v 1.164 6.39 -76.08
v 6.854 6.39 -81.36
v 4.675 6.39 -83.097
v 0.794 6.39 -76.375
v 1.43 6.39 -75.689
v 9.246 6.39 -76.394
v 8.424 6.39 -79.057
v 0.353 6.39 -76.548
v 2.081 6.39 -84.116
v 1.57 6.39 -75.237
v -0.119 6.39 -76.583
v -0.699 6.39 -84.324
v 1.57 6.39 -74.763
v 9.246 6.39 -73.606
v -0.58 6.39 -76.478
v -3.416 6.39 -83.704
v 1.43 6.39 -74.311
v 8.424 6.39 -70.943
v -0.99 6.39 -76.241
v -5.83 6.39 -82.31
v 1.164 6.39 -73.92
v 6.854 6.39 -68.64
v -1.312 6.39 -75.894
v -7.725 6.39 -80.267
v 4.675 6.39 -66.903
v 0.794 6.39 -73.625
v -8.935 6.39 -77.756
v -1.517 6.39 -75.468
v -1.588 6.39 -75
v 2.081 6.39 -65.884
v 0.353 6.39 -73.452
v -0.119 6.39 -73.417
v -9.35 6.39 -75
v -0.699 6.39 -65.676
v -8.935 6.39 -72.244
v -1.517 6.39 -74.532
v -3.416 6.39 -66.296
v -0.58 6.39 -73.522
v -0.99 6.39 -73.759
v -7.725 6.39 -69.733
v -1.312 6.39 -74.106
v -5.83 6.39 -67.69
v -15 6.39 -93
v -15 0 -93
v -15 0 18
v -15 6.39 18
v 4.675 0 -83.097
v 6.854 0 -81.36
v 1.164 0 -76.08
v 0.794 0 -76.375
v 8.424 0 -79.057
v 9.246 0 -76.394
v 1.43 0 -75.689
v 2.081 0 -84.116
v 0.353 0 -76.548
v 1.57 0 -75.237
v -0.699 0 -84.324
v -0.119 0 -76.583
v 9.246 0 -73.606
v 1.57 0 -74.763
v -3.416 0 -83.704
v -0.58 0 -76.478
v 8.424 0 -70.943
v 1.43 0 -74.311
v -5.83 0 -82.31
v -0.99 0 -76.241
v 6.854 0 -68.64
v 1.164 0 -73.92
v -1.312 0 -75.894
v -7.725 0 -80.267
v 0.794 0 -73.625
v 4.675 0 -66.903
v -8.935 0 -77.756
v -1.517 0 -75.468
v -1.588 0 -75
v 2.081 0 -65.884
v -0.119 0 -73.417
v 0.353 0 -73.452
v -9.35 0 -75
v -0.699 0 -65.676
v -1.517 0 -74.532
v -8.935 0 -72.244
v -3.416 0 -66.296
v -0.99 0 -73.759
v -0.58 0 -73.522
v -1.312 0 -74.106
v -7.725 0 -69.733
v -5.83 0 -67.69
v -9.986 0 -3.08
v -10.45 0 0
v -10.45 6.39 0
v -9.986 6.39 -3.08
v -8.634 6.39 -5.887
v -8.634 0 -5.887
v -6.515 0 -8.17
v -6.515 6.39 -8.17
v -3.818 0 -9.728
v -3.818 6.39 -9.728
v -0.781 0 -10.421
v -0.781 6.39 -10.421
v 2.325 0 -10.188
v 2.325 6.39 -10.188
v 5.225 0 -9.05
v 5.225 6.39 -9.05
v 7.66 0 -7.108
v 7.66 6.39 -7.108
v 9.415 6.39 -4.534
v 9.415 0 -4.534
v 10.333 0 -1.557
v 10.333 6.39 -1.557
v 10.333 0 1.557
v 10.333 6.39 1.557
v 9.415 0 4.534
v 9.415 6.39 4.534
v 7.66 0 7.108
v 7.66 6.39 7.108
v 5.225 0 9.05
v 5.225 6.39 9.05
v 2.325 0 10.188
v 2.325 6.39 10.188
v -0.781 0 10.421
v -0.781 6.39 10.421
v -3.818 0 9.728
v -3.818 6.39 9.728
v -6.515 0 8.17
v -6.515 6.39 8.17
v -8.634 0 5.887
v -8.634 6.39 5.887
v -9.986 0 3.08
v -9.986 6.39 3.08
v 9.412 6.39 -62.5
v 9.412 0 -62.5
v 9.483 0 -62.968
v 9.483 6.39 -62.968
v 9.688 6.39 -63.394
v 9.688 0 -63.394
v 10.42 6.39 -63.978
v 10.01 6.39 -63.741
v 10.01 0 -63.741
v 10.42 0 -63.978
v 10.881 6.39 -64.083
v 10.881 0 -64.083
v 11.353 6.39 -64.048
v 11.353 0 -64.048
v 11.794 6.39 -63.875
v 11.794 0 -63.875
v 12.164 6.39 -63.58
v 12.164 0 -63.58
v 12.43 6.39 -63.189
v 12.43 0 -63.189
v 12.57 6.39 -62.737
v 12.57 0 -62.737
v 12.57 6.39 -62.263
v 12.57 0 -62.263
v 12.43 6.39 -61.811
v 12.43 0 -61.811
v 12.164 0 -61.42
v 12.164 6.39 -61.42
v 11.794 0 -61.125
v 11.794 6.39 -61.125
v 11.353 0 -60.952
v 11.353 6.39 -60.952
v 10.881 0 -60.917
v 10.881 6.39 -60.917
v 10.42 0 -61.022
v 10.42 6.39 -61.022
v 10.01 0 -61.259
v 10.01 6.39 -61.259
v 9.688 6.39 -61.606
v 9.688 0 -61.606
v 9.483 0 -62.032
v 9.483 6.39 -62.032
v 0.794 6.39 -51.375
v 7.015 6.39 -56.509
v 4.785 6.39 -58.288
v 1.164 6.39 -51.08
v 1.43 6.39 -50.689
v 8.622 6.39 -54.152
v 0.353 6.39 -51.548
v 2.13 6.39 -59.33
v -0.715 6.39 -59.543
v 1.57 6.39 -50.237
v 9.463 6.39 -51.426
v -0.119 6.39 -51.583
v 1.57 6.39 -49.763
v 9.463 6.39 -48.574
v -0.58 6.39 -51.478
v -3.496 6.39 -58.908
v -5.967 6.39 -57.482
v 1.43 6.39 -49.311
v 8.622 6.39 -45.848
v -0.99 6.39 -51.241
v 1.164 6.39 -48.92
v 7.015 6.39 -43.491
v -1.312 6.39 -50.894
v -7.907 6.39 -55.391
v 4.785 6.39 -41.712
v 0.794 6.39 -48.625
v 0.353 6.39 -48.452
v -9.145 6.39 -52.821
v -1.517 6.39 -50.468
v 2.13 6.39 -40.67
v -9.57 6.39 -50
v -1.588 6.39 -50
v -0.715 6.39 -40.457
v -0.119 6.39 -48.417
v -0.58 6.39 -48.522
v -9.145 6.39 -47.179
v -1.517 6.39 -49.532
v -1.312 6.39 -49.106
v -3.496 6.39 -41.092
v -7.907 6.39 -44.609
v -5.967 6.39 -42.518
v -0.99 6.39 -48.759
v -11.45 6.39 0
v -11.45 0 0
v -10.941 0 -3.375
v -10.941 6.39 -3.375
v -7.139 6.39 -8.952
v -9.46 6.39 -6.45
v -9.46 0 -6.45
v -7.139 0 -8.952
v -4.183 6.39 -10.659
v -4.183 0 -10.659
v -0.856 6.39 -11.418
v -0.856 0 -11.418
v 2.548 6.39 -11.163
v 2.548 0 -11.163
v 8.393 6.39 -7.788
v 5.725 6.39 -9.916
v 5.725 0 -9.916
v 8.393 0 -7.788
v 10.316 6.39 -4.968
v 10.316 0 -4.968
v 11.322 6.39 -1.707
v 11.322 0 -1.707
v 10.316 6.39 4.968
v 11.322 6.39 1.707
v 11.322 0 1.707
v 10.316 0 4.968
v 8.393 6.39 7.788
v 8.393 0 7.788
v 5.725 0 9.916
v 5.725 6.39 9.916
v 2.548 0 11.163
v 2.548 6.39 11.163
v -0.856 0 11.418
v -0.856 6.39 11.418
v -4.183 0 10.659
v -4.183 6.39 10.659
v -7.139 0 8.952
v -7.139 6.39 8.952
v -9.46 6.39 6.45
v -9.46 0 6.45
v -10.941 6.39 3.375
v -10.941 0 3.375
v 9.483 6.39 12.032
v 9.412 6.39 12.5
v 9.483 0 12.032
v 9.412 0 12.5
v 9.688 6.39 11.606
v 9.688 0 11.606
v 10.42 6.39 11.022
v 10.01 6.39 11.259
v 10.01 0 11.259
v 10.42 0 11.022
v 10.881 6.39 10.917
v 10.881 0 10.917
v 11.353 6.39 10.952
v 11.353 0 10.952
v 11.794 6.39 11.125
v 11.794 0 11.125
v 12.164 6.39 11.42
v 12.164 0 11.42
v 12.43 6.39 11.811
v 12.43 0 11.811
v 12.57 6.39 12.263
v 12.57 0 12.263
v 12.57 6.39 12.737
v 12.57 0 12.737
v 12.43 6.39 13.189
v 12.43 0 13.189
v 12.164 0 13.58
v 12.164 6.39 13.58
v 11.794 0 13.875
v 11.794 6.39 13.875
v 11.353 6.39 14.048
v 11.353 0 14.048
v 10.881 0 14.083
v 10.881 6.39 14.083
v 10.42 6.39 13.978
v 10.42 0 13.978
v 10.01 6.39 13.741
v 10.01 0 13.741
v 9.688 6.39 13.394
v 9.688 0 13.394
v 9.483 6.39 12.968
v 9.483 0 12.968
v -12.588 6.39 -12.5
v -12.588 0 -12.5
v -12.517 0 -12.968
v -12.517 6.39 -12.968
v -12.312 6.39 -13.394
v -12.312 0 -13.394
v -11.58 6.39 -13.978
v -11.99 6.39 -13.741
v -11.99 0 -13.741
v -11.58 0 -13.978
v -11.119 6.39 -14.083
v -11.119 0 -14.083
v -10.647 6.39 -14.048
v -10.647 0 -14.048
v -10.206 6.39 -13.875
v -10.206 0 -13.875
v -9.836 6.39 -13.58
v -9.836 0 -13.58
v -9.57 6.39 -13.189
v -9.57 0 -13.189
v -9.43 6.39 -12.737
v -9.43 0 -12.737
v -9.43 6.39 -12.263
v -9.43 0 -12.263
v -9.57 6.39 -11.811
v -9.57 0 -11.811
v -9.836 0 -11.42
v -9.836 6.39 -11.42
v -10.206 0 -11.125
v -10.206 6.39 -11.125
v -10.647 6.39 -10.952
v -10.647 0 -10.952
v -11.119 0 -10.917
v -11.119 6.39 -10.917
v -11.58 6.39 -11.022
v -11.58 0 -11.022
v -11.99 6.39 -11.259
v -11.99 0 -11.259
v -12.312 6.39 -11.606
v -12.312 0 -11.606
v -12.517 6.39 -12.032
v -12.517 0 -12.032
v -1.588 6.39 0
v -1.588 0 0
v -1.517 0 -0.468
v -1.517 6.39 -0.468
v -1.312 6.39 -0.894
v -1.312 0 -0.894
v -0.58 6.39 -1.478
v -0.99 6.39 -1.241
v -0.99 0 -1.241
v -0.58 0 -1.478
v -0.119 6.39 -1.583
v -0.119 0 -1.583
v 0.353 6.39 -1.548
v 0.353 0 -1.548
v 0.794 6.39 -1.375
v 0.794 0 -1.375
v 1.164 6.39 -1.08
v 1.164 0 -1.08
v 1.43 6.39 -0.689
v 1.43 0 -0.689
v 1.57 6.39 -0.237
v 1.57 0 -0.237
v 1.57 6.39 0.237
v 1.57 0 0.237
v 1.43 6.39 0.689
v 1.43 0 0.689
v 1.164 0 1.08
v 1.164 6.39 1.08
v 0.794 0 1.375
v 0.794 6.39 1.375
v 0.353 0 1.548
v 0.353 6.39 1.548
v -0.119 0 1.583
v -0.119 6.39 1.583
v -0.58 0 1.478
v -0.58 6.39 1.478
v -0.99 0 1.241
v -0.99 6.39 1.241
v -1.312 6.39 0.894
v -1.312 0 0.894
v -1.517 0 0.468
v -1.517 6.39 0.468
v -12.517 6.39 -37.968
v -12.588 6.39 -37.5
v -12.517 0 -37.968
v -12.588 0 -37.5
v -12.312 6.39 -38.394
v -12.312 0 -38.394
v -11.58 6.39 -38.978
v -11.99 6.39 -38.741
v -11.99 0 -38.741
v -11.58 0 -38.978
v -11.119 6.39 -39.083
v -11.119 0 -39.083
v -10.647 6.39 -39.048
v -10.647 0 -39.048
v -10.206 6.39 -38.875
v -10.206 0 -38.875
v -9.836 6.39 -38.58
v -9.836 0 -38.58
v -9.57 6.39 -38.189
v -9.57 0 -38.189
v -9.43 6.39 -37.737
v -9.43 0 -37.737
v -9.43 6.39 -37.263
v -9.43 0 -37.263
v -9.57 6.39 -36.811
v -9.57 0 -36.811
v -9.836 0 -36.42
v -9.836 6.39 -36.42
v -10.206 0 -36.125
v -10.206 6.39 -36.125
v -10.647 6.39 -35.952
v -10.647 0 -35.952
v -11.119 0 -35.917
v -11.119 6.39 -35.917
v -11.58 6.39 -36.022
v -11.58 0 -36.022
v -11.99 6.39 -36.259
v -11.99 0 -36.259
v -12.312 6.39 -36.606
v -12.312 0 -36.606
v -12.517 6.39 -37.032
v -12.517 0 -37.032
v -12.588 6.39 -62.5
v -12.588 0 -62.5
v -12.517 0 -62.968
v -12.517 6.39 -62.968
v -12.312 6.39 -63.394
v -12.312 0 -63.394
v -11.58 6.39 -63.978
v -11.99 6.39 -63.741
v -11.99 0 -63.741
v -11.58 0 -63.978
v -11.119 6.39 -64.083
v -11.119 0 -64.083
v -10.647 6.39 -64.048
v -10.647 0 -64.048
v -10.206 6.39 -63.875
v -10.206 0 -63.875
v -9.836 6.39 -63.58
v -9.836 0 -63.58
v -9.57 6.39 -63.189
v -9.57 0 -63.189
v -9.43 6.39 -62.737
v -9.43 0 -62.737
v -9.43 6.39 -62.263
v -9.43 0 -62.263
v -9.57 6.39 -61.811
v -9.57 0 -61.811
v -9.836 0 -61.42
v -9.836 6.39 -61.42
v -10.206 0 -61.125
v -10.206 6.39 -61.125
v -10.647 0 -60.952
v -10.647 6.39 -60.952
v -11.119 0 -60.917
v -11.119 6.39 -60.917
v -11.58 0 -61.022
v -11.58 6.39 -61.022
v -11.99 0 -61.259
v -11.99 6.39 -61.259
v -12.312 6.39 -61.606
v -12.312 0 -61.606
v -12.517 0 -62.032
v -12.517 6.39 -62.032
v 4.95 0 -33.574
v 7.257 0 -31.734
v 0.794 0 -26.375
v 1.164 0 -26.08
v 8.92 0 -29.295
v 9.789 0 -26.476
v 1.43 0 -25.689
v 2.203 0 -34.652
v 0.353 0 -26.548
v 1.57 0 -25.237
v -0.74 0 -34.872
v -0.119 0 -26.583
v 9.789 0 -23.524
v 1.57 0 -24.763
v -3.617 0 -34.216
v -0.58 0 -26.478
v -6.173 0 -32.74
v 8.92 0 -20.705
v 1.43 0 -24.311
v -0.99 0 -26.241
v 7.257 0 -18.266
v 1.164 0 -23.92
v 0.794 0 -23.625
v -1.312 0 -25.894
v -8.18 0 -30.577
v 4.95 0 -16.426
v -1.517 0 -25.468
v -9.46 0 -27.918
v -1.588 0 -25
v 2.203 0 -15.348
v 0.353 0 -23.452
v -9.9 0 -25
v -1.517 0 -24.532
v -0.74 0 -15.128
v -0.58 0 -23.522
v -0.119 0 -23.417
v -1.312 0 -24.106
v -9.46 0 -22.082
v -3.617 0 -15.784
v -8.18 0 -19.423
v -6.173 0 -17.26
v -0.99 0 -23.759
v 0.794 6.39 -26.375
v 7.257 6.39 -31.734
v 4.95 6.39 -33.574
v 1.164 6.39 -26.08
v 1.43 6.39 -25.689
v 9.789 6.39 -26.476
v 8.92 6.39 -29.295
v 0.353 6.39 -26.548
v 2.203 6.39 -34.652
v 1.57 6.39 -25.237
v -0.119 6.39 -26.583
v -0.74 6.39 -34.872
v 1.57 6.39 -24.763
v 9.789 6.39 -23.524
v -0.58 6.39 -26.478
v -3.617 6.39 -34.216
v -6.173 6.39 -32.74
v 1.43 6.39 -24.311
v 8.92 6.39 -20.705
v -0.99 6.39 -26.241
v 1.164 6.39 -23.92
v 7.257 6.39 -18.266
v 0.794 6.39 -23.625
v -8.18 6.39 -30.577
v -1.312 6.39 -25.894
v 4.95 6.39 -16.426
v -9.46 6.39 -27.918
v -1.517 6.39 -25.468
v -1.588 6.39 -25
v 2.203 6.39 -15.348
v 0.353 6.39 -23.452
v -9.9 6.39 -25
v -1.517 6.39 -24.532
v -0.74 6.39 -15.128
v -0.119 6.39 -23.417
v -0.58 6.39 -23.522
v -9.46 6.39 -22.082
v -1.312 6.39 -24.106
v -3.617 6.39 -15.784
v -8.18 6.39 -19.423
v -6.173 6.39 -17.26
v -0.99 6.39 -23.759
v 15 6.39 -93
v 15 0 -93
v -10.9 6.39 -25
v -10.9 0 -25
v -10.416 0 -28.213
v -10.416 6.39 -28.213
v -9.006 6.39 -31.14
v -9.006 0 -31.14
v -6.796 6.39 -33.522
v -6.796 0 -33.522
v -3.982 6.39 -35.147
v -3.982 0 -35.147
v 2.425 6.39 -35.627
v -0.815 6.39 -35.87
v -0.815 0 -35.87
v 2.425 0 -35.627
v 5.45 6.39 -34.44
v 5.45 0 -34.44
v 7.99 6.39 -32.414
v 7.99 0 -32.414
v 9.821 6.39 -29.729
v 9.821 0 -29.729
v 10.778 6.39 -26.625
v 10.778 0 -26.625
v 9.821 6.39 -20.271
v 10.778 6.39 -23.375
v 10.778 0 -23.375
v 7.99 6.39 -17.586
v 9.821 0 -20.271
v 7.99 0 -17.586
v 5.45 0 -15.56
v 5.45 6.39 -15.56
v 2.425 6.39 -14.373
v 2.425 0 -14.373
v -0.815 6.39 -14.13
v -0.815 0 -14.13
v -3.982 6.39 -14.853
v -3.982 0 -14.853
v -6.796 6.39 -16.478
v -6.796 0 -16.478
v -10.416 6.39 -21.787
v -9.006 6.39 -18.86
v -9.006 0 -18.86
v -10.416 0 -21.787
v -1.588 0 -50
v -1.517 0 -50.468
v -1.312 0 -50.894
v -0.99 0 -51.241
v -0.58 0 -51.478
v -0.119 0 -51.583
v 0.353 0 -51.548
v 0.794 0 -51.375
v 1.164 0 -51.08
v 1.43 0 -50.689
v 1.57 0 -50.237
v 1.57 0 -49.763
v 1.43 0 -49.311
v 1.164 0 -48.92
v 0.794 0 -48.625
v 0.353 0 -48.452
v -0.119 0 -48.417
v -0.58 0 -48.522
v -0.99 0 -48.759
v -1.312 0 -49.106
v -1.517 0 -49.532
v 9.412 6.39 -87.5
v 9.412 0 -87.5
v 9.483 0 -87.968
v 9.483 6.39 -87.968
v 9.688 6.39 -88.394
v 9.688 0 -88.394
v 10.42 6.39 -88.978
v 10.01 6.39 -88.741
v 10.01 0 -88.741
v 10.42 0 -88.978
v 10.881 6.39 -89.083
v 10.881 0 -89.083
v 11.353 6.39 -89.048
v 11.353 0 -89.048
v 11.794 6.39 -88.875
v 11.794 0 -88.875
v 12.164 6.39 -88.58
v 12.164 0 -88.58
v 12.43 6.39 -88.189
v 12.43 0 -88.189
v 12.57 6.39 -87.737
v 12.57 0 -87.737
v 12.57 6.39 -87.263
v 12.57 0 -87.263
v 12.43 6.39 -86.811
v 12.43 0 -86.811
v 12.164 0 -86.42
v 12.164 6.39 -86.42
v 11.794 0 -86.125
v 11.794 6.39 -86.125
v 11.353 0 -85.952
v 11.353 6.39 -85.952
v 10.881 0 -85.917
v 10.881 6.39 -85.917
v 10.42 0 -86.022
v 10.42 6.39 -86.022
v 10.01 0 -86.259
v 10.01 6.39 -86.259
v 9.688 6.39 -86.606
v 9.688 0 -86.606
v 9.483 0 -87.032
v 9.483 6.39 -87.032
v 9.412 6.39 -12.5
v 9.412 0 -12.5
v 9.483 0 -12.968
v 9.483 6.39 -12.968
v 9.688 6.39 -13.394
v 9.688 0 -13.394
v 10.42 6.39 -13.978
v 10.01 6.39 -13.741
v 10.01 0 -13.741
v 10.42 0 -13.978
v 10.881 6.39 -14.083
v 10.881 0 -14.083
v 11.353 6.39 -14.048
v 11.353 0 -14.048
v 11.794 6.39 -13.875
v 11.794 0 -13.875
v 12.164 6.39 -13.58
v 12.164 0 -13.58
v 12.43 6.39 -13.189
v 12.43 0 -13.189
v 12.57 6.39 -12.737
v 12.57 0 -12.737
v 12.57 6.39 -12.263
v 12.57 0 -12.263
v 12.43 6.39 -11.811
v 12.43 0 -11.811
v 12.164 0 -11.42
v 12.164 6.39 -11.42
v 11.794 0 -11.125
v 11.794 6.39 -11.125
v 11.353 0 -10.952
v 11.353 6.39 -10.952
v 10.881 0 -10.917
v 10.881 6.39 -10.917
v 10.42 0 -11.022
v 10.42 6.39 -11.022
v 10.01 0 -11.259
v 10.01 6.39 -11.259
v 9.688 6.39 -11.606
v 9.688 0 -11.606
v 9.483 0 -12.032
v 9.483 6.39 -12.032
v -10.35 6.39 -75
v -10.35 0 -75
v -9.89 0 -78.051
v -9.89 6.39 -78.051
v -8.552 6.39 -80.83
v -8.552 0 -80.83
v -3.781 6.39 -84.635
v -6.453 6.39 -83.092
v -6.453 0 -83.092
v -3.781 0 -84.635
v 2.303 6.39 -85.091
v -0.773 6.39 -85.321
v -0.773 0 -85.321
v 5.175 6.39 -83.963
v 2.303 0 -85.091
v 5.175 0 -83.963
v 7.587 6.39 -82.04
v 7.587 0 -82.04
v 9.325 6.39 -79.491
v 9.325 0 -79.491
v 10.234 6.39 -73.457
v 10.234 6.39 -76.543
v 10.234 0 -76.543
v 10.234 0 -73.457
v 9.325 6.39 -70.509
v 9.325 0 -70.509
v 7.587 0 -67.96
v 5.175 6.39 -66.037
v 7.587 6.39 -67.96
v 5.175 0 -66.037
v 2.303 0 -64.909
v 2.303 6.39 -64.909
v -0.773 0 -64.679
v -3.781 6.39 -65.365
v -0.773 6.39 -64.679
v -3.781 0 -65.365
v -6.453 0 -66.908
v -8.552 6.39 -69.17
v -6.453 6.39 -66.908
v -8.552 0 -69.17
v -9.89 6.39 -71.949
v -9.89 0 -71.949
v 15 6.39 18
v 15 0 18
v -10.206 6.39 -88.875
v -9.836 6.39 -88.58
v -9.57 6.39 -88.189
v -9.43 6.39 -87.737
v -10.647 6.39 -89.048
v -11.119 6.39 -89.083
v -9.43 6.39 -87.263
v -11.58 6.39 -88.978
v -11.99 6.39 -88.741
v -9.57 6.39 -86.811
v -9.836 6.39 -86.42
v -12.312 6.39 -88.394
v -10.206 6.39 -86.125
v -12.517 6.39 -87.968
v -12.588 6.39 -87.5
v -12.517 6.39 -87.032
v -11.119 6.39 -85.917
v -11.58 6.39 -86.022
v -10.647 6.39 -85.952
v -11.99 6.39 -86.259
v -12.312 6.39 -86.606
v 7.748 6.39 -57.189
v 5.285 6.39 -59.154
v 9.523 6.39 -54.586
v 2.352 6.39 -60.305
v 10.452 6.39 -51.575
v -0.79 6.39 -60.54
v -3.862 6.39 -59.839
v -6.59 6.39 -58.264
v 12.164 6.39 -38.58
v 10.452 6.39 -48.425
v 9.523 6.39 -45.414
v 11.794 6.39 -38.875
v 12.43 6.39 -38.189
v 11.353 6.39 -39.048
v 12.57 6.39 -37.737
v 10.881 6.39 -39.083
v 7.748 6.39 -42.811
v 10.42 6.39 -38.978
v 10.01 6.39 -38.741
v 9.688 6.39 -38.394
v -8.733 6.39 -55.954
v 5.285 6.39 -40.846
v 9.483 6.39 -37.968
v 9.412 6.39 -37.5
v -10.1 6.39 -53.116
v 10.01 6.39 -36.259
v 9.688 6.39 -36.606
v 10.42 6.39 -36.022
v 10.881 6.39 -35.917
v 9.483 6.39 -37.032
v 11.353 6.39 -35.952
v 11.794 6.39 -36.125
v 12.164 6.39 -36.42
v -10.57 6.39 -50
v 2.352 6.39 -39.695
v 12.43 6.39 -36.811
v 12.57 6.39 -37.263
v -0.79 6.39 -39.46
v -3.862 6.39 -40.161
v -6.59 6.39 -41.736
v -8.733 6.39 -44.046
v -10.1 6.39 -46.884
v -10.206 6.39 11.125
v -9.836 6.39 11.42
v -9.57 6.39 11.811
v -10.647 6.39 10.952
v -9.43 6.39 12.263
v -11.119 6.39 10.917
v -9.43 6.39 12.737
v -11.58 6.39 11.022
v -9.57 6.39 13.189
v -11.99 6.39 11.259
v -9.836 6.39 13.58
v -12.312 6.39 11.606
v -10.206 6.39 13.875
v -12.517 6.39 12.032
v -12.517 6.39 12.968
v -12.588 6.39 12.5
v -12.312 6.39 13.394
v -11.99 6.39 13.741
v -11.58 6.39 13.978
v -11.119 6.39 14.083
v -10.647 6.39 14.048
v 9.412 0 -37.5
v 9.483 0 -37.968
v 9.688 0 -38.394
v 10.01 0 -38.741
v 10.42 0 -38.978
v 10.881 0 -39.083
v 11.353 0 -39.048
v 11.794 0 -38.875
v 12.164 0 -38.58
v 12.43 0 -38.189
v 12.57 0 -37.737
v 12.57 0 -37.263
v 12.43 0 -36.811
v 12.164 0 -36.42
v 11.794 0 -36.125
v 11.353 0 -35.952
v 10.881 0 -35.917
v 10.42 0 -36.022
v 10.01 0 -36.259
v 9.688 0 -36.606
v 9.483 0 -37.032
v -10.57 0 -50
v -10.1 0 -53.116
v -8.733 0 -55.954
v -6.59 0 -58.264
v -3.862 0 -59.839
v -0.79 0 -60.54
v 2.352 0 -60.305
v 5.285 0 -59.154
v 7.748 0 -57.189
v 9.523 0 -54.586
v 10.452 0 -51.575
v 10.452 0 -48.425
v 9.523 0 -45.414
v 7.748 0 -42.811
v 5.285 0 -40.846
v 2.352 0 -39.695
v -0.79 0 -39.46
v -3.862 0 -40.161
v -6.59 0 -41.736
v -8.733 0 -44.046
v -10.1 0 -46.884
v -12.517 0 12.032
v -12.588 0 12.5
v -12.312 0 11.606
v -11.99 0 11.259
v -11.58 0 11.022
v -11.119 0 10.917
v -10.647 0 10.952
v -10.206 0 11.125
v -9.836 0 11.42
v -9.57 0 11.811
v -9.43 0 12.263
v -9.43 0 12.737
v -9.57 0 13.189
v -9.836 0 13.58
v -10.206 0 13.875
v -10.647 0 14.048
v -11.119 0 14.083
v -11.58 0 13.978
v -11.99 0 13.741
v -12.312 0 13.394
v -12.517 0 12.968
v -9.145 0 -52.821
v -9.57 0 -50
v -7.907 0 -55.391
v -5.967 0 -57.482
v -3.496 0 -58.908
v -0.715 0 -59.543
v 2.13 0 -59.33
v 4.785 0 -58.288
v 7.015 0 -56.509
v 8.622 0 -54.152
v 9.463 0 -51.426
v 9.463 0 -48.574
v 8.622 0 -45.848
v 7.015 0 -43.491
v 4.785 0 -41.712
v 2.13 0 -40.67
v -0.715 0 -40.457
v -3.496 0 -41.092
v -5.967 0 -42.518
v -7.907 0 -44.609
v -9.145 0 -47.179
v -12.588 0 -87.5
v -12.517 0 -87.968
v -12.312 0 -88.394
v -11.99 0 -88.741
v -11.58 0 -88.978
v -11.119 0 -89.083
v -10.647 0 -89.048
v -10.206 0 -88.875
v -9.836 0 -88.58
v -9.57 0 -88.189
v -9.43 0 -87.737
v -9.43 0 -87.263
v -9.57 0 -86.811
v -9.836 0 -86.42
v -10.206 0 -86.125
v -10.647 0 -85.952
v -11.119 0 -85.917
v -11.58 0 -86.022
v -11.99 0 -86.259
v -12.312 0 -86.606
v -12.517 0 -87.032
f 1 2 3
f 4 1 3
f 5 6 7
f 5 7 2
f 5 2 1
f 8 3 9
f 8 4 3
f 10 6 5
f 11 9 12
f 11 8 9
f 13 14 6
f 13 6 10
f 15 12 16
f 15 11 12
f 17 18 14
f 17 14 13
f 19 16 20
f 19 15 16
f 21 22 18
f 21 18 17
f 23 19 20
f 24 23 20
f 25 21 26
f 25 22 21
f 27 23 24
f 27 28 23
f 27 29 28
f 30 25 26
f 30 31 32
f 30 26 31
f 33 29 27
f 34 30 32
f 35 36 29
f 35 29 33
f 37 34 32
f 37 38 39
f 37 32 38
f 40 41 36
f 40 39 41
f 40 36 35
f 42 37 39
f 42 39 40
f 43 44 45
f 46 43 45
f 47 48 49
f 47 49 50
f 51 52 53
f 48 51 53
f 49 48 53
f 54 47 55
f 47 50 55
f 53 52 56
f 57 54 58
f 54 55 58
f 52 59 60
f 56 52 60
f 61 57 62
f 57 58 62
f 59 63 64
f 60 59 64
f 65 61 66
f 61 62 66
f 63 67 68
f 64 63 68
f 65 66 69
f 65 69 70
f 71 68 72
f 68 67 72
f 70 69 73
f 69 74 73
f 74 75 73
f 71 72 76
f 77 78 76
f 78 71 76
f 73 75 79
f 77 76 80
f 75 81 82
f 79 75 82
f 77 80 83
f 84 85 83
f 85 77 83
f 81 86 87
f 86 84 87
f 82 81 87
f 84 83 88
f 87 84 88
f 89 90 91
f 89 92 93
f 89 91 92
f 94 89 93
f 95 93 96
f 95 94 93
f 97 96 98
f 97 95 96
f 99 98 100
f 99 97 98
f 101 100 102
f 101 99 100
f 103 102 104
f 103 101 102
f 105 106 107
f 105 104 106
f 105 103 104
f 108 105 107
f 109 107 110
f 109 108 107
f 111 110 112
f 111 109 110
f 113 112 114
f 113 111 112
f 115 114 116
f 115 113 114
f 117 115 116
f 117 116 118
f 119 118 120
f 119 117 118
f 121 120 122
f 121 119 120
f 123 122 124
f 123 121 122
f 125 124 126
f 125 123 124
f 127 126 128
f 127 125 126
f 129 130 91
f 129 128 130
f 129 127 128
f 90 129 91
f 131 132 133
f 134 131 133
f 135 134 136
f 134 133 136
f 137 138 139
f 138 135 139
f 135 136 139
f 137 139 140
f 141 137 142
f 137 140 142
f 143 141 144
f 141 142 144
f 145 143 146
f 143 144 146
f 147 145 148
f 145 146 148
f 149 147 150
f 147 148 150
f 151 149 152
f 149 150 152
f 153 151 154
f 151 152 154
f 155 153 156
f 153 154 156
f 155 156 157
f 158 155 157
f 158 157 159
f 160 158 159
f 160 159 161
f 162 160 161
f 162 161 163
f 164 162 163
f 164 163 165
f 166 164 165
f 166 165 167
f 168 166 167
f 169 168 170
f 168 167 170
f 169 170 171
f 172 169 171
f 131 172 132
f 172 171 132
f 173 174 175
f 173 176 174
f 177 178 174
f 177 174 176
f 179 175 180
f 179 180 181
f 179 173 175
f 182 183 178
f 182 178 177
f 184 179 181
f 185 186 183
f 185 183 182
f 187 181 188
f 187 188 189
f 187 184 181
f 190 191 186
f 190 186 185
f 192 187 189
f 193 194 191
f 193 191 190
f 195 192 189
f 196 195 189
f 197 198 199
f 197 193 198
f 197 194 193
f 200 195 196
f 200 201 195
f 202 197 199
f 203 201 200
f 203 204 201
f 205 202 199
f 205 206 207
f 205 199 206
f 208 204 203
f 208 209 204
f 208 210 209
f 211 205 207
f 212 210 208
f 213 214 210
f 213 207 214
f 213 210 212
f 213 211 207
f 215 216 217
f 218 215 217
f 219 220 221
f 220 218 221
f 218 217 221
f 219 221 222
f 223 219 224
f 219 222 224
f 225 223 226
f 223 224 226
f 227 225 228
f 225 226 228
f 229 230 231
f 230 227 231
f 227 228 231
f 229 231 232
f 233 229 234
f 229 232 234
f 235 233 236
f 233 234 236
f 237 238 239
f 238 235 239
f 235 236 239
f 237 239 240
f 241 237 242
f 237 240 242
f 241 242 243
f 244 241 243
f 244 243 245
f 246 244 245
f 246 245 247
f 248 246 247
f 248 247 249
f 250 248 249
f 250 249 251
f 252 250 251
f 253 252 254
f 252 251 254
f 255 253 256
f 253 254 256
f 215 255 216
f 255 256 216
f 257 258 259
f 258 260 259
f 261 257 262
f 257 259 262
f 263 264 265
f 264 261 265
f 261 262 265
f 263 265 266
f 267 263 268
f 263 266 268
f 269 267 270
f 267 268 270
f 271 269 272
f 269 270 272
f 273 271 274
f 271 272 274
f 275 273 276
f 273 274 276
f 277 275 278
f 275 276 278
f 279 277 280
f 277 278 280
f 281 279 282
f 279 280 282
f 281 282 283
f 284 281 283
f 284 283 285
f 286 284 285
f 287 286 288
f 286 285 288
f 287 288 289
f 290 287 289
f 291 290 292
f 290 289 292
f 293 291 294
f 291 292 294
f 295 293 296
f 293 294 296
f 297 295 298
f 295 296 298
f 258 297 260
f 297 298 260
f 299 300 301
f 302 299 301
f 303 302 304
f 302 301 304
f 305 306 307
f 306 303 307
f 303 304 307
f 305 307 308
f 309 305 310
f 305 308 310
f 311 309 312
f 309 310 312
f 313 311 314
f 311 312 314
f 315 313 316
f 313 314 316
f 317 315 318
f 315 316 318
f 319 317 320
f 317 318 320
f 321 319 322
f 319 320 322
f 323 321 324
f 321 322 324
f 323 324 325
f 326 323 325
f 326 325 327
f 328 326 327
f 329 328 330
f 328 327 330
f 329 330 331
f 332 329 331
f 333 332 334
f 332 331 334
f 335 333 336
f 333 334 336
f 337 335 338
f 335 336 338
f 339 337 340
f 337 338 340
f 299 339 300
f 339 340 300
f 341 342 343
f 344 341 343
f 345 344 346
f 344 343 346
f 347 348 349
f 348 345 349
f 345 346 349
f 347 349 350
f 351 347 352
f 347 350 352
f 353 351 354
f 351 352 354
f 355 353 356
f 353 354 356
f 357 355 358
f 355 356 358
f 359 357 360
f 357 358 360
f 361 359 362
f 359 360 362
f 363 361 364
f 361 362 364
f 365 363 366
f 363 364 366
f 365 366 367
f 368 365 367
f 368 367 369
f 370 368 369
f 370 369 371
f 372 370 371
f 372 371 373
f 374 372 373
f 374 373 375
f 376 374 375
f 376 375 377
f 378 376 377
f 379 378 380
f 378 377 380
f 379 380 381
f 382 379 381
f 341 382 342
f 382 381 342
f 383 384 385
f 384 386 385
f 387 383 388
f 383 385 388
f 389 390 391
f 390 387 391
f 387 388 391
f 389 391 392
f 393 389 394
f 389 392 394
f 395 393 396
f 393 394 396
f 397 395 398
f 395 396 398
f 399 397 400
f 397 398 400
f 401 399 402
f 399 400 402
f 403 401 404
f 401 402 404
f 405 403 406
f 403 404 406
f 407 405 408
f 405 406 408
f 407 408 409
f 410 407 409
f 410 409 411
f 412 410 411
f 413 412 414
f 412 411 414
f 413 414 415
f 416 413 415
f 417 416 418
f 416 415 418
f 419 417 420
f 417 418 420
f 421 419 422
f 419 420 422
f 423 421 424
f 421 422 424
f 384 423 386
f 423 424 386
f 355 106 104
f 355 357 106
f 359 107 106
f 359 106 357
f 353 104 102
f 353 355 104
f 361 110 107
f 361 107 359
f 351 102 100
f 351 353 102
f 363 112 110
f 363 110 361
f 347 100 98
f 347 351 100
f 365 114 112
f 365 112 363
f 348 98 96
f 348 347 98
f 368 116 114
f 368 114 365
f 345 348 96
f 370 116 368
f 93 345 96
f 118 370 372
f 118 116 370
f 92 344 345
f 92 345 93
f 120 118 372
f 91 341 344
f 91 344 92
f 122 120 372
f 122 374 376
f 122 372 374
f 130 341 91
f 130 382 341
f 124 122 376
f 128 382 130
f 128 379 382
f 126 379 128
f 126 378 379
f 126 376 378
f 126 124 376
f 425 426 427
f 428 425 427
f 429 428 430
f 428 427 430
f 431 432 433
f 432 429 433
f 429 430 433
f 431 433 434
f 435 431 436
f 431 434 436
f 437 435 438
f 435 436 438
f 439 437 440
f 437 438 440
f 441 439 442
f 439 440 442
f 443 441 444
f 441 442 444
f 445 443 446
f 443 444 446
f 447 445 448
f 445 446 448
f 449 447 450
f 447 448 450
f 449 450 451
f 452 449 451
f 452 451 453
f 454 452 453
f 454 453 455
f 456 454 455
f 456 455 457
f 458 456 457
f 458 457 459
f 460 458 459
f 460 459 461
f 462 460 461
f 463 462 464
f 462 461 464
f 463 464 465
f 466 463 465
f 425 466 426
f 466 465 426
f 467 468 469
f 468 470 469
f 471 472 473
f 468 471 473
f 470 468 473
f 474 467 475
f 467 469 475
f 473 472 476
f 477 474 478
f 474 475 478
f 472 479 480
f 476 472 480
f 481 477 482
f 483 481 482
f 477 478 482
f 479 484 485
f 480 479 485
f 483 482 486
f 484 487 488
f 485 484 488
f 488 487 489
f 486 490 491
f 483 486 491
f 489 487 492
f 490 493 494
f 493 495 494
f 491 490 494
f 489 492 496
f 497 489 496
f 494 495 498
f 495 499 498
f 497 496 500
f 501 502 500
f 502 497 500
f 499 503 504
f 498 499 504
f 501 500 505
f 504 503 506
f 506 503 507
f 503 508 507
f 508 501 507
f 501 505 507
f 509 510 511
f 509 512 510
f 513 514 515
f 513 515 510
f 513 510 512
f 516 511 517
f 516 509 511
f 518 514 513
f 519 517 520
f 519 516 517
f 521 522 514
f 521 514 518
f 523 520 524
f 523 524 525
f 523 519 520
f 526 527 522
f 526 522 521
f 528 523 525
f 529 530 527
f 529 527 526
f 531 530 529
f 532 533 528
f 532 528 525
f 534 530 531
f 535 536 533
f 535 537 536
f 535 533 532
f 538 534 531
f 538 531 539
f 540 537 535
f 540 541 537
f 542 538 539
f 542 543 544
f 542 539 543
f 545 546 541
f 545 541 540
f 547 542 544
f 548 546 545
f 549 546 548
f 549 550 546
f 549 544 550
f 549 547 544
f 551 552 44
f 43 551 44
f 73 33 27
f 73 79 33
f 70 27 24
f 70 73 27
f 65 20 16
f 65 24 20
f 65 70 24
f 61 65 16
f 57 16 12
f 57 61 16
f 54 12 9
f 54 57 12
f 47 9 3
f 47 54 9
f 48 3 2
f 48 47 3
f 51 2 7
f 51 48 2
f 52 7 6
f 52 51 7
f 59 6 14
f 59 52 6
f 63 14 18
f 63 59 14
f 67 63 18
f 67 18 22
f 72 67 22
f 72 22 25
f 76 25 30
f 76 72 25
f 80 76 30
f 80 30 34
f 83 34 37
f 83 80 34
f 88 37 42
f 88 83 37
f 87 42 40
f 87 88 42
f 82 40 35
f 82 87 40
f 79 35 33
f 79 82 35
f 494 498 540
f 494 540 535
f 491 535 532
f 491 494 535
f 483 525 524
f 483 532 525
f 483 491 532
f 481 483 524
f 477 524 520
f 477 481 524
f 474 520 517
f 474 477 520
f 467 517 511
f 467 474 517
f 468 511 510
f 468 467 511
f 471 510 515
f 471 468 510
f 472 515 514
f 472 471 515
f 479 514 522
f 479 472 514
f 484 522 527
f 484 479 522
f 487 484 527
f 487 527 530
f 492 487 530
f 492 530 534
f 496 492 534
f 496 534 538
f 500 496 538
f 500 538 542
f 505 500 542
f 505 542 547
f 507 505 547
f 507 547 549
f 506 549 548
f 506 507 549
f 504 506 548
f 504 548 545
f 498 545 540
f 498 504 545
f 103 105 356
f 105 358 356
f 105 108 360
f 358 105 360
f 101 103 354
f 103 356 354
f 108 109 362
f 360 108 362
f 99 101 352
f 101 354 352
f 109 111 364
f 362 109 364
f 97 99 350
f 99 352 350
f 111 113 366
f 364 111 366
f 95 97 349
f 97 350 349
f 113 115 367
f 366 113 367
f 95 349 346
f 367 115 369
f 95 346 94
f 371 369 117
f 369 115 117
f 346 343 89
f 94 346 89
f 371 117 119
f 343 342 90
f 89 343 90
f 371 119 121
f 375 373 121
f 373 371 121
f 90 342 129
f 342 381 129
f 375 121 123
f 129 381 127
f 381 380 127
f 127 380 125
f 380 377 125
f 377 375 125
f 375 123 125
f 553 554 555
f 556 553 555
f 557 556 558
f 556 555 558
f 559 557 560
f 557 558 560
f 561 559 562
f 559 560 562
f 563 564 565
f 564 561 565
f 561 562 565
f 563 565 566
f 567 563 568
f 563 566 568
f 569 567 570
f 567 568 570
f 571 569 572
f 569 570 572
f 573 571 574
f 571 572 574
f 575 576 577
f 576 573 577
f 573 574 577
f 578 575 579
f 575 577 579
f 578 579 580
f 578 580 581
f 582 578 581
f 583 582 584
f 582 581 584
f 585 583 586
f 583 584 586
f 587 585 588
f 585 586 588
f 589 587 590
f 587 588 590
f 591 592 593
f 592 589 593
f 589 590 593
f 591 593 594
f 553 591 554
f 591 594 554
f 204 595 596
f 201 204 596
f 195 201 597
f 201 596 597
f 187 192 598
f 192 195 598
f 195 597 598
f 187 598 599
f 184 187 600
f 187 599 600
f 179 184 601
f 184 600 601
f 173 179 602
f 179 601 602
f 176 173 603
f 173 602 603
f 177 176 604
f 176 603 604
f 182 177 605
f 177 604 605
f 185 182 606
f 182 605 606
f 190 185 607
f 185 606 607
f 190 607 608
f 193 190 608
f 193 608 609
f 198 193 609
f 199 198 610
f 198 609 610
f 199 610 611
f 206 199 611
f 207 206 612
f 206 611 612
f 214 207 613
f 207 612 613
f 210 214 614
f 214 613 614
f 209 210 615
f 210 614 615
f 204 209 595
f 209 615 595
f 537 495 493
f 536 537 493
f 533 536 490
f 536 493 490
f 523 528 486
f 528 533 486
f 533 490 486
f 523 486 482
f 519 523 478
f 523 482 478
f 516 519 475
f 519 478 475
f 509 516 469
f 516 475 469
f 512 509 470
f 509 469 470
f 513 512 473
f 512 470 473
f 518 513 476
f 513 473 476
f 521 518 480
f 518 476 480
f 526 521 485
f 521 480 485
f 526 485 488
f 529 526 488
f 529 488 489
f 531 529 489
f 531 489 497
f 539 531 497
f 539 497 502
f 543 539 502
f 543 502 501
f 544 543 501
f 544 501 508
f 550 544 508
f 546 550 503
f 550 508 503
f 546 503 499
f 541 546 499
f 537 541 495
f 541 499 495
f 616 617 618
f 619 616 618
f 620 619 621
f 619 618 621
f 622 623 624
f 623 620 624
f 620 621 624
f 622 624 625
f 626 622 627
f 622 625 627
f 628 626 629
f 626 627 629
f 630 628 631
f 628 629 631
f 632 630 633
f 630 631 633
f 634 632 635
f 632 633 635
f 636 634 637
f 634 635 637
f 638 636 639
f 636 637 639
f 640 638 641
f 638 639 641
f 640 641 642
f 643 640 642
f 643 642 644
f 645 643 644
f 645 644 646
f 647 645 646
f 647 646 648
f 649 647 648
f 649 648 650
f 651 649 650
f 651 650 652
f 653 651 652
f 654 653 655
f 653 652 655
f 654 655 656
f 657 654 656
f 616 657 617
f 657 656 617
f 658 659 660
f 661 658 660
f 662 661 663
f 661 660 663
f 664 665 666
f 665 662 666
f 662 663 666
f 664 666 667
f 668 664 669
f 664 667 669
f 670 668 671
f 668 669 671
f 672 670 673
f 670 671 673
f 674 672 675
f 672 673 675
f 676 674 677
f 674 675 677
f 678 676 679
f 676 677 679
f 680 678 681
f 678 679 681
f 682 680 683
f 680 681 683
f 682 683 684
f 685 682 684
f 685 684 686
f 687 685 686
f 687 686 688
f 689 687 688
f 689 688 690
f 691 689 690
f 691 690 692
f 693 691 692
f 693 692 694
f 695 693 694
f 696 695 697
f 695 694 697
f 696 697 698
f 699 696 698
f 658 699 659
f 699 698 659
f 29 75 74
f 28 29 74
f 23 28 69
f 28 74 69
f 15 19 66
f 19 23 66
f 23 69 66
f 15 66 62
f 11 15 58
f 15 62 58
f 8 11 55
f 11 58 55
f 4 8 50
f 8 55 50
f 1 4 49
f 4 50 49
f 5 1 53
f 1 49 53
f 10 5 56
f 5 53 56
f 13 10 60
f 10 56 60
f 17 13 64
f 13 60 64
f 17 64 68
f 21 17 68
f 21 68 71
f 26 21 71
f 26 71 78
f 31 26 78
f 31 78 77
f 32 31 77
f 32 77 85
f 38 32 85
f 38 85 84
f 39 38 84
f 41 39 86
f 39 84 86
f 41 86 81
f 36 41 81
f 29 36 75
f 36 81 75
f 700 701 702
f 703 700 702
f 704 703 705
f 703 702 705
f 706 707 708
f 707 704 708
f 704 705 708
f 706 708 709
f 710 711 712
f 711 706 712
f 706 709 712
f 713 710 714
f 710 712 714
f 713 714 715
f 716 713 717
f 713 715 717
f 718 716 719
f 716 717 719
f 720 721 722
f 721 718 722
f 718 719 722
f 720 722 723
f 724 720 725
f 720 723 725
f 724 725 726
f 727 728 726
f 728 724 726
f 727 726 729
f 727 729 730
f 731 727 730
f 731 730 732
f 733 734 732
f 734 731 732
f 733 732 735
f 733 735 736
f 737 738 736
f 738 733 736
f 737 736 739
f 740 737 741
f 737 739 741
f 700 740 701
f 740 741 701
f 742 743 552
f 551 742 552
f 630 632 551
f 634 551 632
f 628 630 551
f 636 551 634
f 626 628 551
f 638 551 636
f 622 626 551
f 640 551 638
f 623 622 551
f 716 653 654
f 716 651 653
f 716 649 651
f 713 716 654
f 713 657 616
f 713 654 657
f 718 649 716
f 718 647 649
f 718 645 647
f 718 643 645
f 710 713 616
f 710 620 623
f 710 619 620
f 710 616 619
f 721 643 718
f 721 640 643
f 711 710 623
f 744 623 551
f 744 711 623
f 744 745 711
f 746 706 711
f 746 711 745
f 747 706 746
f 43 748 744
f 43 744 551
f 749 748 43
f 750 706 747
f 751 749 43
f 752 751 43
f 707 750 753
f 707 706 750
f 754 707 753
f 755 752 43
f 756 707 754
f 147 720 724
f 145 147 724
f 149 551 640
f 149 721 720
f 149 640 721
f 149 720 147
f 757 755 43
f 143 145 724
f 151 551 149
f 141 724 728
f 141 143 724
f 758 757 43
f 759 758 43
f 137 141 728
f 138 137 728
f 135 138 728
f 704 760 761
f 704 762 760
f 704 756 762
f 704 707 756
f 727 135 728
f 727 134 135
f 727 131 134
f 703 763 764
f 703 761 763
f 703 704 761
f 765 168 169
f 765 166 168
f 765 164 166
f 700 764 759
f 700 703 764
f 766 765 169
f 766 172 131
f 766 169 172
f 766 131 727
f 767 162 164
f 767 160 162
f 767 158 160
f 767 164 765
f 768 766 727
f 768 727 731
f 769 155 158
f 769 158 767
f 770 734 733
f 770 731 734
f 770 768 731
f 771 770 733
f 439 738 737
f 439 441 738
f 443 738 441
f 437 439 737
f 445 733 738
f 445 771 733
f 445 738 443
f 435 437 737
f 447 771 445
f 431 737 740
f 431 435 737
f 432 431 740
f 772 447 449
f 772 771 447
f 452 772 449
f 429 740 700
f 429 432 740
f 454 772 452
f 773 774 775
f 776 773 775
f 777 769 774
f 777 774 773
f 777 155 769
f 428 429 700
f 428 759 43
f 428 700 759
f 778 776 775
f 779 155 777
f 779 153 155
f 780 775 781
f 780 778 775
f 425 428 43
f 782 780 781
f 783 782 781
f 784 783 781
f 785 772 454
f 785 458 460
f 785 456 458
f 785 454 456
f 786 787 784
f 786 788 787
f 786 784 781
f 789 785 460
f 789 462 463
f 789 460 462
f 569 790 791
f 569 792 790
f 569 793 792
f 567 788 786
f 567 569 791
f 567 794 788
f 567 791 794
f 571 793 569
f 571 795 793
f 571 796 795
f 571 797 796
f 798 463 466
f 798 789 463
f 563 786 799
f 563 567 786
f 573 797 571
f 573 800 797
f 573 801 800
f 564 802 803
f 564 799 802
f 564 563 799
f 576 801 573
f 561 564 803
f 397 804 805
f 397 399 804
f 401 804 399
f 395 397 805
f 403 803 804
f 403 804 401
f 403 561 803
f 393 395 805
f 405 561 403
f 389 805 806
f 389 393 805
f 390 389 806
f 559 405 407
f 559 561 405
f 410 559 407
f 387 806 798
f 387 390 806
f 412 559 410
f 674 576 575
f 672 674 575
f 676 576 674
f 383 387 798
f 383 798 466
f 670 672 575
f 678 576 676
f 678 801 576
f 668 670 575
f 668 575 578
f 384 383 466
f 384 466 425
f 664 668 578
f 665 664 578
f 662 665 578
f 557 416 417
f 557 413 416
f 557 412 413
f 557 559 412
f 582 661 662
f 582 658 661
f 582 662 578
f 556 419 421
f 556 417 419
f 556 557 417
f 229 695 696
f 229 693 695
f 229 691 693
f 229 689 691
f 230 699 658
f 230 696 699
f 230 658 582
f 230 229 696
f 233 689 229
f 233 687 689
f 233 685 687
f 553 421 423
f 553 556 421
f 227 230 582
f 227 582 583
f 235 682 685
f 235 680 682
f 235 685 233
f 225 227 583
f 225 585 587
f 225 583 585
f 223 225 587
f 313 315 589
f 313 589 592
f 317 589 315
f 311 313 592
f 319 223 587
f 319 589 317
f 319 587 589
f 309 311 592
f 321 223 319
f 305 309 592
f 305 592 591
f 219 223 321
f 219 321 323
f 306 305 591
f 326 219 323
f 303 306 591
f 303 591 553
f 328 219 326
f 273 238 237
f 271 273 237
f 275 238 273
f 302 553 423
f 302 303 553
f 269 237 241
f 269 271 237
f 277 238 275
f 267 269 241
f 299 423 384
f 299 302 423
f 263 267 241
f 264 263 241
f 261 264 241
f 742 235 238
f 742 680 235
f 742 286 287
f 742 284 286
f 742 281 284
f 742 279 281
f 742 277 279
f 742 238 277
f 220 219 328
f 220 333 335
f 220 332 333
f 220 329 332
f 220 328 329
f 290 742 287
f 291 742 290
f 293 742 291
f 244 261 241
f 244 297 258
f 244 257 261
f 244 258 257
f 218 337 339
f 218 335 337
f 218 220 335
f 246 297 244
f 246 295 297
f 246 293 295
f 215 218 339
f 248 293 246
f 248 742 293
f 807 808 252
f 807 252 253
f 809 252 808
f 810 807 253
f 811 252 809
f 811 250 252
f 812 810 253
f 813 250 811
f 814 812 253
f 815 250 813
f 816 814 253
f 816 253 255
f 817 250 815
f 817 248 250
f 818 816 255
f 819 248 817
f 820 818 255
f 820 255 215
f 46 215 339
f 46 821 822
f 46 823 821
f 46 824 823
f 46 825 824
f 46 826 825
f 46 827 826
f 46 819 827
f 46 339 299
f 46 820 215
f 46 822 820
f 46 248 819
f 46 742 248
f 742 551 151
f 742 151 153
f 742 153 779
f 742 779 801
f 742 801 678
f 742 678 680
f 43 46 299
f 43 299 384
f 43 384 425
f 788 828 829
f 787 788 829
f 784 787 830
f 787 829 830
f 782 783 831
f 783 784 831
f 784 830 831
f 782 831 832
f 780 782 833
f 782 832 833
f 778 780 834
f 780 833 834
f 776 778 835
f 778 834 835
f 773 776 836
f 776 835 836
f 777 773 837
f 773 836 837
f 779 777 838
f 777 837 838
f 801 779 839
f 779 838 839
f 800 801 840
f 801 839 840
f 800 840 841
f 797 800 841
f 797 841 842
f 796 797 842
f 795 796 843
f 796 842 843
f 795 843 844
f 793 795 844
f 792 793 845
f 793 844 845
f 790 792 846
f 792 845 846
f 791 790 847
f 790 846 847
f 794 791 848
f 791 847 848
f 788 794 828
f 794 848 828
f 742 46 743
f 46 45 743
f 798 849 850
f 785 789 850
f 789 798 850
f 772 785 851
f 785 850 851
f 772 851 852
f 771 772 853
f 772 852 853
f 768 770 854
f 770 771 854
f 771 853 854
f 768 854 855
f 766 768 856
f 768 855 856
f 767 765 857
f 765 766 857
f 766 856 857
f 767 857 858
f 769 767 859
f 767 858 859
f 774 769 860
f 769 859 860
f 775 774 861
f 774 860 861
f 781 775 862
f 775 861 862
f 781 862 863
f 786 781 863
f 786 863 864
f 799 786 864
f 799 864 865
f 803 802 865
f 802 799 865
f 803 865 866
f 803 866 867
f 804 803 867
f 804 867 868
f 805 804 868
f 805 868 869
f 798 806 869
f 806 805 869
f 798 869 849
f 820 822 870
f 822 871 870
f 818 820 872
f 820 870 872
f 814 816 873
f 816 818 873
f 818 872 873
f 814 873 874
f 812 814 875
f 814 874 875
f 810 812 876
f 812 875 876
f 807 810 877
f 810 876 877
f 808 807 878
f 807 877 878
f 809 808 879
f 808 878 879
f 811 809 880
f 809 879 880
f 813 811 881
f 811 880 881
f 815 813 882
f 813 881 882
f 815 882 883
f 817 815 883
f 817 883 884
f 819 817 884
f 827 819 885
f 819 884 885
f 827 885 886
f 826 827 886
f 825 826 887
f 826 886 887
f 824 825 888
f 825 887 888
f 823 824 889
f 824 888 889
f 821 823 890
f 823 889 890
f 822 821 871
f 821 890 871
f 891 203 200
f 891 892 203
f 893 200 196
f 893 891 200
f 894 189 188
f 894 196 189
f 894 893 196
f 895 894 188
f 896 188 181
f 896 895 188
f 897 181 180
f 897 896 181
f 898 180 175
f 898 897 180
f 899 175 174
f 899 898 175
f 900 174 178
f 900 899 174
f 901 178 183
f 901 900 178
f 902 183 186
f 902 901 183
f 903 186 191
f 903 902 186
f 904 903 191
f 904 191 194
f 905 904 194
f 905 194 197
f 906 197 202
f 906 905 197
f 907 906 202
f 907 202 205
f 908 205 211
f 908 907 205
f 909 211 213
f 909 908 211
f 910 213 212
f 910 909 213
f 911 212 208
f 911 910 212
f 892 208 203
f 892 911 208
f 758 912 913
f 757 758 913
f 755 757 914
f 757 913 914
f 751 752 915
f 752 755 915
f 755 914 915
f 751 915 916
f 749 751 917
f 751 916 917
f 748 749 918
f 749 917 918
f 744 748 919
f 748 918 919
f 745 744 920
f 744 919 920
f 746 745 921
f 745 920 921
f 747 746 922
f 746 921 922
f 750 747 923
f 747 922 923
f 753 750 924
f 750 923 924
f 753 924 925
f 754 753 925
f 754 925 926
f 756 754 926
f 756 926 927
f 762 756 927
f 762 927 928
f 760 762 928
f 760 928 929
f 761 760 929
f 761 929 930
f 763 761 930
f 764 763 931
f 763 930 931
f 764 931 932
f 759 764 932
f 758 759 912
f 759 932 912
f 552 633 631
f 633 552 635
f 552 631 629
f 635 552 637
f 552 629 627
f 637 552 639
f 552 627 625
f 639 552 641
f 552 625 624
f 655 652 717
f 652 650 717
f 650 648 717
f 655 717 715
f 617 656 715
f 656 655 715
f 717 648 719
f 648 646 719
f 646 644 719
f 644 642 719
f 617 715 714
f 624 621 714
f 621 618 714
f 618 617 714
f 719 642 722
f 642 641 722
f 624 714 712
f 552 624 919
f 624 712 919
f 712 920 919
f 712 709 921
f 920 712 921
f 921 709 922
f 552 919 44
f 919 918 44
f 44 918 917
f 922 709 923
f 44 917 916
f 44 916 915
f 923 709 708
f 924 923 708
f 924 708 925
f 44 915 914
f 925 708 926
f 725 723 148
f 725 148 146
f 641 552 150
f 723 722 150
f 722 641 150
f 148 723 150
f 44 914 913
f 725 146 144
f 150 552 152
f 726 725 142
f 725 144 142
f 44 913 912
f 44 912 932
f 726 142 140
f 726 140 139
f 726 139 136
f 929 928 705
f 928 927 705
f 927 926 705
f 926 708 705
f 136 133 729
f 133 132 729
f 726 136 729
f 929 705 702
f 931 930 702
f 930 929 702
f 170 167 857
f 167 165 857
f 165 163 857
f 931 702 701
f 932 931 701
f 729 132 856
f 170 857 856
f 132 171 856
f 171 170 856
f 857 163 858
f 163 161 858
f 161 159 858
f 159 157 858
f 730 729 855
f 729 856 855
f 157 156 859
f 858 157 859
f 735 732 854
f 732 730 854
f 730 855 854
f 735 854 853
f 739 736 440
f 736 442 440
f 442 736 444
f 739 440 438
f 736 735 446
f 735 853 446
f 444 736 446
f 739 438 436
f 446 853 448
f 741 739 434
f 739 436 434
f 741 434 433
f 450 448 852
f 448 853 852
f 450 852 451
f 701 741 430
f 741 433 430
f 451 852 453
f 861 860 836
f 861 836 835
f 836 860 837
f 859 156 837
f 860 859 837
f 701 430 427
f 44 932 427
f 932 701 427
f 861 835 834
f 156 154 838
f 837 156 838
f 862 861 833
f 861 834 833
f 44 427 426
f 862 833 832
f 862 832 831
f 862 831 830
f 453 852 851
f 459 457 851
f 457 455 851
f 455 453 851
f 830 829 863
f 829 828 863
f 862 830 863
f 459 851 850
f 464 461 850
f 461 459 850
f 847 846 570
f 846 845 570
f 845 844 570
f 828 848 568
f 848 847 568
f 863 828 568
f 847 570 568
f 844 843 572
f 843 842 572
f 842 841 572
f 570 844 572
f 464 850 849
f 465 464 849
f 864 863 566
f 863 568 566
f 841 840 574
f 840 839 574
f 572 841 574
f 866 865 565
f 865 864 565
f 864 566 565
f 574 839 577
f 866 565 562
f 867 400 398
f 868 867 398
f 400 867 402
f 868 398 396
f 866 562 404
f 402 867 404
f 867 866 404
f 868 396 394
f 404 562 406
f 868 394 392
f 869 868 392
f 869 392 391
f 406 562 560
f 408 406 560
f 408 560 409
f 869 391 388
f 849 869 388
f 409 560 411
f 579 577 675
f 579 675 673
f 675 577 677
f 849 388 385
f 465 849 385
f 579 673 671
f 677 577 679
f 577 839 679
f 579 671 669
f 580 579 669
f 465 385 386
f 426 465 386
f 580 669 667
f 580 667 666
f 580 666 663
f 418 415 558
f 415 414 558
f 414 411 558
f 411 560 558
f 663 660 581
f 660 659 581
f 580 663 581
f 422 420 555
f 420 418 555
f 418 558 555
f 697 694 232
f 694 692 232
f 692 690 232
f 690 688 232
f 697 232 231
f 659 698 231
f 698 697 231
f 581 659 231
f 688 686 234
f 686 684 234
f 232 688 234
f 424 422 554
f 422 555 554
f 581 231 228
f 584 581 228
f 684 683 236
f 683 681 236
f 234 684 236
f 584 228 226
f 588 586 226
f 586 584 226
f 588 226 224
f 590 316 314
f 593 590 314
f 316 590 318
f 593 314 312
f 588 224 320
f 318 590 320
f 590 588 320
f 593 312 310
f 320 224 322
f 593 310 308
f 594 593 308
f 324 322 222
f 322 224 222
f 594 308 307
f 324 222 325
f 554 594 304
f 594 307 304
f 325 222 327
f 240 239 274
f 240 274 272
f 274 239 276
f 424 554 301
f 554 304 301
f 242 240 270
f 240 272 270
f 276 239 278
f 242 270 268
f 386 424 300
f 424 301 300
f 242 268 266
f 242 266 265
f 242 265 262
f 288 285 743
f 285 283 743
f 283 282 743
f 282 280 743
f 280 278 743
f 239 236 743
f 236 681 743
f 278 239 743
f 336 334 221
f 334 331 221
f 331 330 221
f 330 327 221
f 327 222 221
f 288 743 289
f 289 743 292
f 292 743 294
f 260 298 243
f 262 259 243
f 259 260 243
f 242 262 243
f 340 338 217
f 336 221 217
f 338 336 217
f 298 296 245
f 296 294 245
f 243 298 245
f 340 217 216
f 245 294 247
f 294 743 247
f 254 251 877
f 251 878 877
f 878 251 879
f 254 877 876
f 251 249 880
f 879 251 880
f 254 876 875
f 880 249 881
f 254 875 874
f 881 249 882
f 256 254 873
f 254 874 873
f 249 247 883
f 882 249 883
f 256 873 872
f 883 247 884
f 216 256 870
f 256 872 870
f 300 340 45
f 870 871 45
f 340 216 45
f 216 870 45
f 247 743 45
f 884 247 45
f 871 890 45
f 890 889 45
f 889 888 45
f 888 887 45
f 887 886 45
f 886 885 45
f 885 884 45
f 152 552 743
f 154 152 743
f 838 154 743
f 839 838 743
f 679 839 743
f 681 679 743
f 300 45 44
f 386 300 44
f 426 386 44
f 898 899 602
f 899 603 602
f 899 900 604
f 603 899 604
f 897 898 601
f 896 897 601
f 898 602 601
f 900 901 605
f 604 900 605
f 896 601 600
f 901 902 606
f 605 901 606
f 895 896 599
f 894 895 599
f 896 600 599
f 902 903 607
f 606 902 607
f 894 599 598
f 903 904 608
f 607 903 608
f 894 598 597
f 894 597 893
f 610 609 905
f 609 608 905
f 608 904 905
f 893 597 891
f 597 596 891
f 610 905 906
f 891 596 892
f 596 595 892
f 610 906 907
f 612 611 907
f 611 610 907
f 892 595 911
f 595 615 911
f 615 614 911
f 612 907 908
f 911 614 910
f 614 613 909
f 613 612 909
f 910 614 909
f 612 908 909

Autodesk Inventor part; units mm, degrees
ref_plane "YZ Plane" through (0, 0, 0) normal (1, 0, 0) x (0, 1, 0)
ref_plane "XZ Plane" through (0, 0, 0) normal (0, 1, 0) x (-1, 0, 0)
ref_plane "XY Plane" through (0, 0, 0) normal (0, 0, 1) x (1, 0, 0)
sketch "Sketch1" plane through (0, 0, 0) normal (0, 1, 0) x (-1, 0, 0)
  circle A0 centre (0, 0) radius 10.45
  circle A1 centre (0, 0) radius 1.5875
  circle A2 centre (0, -25) radius 9.9
  circle A3 centre (0, -25) radius 1.5875
  circle A4 centre (0, -50) radius 9.57
  circle A5 centre (0, -50) radius 1.5875
  circle A6 centre (0, -75) radius 9.35
  circle A7 centre (0, -75) radius 1.5875
  line L0 (15, 18) -> (-15, 18)
  line L1 (-15, 18) -> (-15, -93)
  line L2 (-15, -93) -> (15, -93)
  line L3 (15, -93) -> (15, 18)
  circle A8 centre (0, 0) radius 11.45
  circle A9 centre (0, -25) radius 10.9
  circle A10 centre (0, -50) radius 10.57
  circle A11 centre (0, -75) radius 10.35
  circle A12 centre (11, -12.5) radius 1.5875
  line L4 (0, 0) -> (0, -25) construction
  line L5 (0, 0) -> (-15, 0) construction
  line L6 (0, -25) -> (-15, -25) construction
  line L7 (0, -50) -> (-15, -50) construction
  line L8 (0, -75) -> (-15, -75) construction
  circle A13 centre (-11, -12.5) radius 1.5875
  circle A14 centre (11, 12.5) radius 1.5875
  circle A15 centre (-11, 12.5) radius 1.5875
  circle A16 centre (11, -37.5) radius 1.5875
  circle A17 centre (-11, -37.5) radius 1.5875
  circle A18 centre (11, -62.5) radius 1.5875
  circle A19 centre (-11, -62.5) radius 1.5875
  circle A20 centre (11, -87.5) radius 1.5875
  circle A21 centre (-11, -87.5) radius 1.5875
  point P0 (0, -12.5)
  dimension "d0" = 20.9
  dimension "d1" = 3.175
  dimension "d2" = 19.8
  dimension "d3" = 3.175
  dimension "d4" = 19.14
  dimension "d5" = 3.175
  dimension "d6" = 18.7
  dimension "d7" = 3.175
  dimension "d8" = 25
  dimension "d9" = 25
  dimension "d10" = 25
  dimension "d11" = 15
  dimension "d12" = 15
  dimension "d13" = 18
  dimension "d14" = 18
  dimension "d15" = 1
  dimension "d16" = 1
  dimension "d17" = 1
  dimension "d18" = 1
  dimension "d19" = 3.175
  dimension "d20" = 4
extrude "Extrusion3" add sketch "Sketch1" along normal blind 6.39
equation "\"d25\" = WoodThickness"
equation "\"WoodThickness\" = 6.39"
properties part number "BearingSilicone_Cavity_cor"
